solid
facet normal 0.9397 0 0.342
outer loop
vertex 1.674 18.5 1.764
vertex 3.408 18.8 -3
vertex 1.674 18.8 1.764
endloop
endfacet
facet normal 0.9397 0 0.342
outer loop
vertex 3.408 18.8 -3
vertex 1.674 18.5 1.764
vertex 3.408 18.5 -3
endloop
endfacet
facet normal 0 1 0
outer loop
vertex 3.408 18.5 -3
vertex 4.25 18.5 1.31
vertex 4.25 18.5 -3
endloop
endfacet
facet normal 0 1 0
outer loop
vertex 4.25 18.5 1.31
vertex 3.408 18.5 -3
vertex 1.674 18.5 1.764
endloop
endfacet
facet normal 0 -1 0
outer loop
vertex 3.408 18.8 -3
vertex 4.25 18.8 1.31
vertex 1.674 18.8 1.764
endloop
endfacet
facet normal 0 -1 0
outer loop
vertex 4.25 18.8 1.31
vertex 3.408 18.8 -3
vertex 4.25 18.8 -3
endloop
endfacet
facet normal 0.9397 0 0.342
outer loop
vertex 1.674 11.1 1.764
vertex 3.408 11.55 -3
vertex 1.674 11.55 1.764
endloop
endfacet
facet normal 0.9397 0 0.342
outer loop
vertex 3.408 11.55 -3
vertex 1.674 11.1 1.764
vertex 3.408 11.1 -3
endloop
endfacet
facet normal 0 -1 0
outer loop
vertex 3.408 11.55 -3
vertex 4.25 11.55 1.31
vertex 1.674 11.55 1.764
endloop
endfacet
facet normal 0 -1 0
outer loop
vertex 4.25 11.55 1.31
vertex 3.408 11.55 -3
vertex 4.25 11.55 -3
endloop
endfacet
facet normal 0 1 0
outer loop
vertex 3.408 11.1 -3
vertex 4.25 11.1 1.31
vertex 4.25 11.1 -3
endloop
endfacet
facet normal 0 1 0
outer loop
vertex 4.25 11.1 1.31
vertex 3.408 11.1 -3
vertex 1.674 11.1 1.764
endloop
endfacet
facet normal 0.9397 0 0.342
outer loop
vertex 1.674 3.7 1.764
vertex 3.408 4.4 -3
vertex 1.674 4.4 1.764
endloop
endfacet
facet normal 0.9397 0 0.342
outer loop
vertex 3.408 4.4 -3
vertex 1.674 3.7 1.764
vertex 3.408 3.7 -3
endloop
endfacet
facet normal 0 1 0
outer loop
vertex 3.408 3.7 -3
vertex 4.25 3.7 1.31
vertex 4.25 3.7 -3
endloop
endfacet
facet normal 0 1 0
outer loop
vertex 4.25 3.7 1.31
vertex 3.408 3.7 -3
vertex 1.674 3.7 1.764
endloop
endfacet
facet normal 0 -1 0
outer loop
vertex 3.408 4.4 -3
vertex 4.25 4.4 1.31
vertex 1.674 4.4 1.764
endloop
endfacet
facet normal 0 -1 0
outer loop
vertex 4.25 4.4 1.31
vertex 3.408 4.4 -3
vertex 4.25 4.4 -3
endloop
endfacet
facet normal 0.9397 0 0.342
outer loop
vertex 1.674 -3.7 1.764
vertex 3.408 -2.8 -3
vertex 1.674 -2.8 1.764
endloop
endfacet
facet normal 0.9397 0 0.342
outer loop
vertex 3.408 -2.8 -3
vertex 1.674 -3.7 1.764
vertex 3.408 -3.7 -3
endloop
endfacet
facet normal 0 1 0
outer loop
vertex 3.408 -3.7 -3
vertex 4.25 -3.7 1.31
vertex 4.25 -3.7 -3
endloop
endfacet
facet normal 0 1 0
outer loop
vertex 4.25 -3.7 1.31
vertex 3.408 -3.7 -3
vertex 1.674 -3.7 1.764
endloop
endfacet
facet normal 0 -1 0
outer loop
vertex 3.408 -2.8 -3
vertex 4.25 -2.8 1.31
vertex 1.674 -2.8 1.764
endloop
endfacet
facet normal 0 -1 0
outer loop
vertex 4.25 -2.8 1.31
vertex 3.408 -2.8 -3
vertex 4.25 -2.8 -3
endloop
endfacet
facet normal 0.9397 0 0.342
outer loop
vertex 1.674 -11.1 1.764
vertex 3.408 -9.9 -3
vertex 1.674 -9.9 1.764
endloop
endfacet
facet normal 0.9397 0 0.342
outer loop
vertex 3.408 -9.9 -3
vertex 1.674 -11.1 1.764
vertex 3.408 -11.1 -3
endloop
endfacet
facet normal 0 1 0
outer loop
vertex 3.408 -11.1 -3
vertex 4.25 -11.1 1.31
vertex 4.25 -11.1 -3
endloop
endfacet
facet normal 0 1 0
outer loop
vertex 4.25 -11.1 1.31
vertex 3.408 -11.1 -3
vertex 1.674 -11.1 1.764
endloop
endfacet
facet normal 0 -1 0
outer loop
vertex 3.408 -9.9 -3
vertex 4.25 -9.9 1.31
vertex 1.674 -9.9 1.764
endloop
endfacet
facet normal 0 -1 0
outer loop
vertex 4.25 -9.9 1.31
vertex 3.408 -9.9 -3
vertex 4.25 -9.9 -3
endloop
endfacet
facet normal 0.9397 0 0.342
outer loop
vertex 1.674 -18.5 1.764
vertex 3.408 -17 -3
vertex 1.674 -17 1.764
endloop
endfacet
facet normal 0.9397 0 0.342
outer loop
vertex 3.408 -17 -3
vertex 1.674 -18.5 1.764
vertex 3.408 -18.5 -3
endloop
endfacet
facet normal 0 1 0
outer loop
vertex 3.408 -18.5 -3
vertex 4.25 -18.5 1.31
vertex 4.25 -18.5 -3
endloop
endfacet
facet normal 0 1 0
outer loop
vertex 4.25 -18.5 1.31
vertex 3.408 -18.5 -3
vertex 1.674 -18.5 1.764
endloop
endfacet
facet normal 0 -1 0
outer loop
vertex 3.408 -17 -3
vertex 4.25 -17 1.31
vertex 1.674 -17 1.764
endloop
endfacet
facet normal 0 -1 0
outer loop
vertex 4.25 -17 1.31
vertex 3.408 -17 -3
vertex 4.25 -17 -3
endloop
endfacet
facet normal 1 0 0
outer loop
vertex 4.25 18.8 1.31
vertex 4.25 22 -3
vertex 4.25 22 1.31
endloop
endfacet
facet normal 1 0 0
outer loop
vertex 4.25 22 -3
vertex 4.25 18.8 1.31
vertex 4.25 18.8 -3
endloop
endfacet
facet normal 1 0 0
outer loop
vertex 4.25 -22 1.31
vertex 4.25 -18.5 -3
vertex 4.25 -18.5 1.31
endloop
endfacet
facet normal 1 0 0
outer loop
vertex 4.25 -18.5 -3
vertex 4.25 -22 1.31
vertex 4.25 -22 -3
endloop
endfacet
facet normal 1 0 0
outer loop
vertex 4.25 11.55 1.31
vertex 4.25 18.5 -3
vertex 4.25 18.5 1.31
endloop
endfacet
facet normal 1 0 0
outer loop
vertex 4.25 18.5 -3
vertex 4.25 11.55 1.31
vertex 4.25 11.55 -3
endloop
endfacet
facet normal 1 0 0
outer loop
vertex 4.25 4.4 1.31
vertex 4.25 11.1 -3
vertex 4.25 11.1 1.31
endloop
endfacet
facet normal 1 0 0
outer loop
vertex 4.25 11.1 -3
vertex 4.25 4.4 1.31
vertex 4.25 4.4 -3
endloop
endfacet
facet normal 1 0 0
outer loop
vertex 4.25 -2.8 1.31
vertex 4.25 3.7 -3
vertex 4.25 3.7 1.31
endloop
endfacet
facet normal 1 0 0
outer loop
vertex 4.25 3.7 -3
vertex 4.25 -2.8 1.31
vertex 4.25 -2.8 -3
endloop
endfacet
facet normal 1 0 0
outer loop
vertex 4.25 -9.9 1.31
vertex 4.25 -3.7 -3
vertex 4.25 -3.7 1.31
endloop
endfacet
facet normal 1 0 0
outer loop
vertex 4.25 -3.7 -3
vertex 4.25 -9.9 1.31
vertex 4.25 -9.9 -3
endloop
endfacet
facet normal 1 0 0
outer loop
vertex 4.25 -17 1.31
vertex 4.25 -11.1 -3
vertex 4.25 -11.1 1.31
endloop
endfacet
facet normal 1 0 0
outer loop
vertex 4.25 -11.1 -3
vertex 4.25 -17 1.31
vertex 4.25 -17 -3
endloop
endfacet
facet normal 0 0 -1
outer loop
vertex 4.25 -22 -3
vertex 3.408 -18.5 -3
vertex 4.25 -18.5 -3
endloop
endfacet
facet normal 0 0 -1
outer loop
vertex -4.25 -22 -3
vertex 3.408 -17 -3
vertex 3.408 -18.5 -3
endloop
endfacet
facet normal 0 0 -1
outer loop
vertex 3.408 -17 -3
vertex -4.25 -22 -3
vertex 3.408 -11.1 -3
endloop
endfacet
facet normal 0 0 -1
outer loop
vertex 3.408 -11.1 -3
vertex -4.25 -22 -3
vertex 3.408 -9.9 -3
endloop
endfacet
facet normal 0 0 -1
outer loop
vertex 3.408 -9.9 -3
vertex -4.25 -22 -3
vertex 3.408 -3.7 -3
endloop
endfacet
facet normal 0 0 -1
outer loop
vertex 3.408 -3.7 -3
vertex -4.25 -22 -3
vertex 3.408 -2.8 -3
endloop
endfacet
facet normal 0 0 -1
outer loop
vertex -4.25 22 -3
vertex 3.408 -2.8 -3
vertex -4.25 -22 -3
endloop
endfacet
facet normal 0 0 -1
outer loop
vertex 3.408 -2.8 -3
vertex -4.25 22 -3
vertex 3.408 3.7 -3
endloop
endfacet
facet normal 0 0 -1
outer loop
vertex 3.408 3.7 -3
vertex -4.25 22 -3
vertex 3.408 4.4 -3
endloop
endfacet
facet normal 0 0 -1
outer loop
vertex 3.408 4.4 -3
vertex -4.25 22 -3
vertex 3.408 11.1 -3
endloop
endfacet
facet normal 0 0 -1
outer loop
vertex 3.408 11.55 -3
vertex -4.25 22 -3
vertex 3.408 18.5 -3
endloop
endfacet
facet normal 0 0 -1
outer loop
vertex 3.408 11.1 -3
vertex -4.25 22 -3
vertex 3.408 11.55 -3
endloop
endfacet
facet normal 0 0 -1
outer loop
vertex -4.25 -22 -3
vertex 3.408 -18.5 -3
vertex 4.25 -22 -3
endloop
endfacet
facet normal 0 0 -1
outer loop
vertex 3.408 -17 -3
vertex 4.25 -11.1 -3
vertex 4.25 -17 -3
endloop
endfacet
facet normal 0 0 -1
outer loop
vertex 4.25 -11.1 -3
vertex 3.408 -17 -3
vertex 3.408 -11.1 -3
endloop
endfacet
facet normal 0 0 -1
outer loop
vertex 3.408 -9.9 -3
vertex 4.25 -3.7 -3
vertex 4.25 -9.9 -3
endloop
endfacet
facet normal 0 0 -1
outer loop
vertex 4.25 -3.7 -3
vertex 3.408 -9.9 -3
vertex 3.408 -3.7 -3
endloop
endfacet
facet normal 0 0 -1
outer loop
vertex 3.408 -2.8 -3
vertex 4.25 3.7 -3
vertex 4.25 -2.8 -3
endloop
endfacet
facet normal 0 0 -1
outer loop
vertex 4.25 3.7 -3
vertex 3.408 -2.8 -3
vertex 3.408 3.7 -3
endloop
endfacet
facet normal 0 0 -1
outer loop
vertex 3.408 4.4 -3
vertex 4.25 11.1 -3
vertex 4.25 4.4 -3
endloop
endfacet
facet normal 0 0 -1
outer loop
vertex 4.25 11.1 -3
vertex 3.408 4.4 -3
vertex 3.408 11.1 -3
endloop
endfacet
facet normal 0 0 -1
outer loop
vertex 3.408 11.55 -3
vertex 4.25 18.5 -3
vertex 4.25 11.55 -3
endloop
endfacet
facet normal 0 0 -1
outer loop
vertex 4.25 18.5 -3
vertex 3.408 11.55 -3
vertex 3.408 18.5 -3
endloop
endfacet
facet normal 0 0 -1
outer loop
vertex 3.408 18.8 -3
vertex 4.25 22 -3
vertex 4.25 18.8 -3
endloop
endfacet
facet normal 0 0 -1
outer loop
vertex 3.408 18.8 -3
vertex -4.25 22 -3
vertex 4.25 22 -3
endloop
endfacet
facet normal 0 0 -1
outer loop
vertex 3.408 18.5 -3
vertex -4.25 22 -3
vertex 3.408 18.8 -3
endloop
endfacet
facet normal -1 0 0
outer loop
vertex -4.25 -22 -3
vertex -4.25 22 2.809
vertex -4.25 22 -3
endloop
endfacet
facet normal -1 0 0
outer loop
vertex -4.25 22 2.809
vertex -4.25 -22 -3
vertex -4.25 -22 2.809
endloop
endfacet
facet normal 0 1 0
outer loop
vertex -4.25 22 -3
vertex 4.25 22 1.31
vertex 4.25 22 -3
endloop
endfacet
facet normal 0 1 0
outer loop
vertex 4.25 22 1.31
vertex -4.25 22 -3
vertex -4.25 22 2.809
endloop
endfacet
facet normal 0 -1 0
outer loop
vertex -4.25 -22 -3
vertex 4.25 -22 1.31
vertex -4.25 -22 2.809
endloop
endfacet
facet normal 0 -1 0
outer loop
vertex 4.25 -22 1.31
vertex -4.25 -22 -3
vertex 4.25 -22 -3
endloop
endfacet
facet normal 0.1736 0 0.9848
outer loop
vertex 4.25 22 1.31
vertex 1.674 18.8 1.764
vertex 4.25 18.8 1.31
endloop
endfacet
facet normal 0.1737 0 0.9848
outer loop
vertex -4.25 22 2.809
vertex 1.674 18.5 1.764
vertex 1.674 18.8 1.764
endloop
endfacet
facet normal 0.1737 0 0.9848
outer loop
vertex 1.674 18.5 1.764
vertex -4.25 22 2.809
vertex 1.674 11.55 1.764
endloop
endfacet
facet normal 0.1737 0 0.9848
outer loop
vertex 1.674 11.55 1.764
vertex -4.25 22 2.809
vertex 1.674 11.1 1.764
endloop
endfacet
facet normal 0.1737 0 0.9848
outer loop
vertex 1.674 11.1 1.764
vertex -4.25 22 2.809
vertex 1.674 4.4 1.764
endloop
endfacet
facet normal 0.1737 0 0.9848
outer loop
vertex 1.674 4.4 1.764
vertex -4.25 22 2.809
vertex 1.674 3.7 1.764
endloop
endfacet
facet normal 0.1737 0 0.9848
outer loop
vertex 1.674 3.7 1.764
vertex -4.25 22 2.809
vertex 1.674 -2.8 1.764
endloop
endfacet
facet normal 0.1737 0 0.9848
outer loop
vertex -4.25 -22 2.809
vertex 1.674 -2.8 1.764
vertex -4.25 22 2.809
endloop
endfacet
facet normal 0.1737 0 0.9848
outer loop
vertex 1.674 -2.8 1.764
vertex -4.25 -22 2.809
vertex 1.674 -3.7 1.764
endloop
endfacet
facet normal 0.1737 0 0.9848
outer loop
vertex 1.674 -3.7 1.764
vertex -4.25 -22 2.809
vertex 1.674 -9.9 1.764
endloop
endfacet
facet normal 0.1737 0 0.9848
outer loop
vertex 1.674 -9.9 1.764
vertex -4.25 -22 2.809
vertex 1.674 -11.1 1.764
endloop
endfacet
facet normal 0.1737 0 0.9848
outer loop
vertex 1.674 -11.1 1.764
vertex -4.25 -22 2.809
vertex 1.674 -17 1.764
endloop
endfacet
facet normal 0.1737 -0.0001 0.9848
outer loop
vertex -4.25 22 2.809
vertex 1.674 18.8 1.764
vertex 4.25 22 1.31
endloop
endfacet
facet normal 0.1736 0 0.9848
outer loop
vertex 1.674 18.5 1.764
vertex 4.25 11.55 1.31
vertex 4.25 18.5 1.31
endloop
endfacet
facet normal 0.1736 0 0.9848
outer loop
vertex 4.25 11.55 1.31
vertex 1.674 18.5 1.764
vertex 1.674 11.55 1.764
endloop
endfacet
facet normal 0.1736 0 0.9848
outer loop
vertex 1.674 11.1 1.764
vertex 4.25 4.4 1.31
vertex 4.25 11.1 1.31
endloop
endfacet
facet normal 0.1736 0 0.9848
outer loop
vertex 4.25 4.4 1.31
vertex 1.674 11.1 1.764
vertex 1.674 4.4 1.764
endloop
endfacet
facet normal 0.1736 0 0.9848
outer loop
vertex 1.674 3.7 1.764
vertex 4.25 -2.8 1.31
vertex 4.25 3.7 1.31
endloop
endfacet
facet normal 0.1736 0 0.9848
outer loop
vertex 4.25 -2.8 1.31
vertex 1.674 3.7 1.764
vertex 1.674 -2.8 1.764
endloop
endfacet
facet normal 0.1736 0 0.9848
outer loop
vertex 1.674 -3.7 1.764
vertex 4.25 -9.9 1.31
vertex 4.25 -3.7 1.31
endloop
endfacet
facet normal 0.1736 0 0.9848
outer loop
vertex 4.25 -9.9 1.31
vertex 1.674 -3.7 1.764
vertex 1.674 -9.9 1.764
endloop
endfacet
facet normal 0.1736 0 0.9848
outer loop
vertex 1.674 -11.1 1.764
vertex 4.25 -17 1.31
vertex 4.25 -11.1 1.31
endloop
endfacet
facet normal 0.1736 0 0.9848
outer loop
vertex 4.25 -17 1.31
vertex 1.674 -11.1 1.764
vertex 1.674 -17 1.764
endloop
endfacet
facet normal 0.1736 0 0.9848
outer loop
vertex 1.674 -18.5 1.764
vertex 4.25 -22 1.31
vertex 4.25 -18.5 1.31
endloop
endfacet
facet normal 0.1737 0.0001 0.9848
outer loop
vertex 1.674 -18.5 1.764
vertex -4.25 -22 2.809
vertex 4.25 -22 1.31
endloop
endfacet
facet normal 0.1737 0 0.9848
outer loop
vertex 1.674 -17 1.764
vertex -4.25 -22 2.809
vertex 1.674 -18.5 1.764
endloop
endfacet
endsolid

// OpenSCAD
/*

	Guitar nut for acoustic guitar

*/

neckW = 44;
height = 8.5;
depth = 6;

module guitar_nut()
{

	difference()
	{
		//The base cube
		cube([height,neckW,depth],center=true);
		//Cutting off the end in angle
		translate([0.6,0,5])rotate([0,10,0])cube([height+10,neckW+10,depth],center=true);
		//gaps for the strings
		gaps();
	}
}




module gaps()
{
    rotation = -20;
    grooveX = 4.5;
    grooveZ = -6;
    
	translate([grooveX, 18.5,grooveZ]) rotate([0,rotation,0]) cube([-grooveZ,0.3,20]);
	translate([grooveX, 11.1,grooveZ]) rotate([0,rotation,0]) cube([-grooveZ,0.45,20]);
	translate([grooveX,  3.7,grooveZ]) rotate([0,rotation,0]) cube([-grooveZ,0.7,20]);
	translate([grooveX, -3.7,grooveZ]) rotate([0,rotation,0]) cube([-grooveZ,0.9,20]);
	translate([grooveX,-11.1,grooveZ]) rotate([0,rotation,0]) cube([-grooveZ,1.2,20]);
	translate([grooveX,-18.5,grooveZ]) rotate([0,rotation,0]) cube([-grooveZ,1.5,20]);
	
}


guitar_nut();
